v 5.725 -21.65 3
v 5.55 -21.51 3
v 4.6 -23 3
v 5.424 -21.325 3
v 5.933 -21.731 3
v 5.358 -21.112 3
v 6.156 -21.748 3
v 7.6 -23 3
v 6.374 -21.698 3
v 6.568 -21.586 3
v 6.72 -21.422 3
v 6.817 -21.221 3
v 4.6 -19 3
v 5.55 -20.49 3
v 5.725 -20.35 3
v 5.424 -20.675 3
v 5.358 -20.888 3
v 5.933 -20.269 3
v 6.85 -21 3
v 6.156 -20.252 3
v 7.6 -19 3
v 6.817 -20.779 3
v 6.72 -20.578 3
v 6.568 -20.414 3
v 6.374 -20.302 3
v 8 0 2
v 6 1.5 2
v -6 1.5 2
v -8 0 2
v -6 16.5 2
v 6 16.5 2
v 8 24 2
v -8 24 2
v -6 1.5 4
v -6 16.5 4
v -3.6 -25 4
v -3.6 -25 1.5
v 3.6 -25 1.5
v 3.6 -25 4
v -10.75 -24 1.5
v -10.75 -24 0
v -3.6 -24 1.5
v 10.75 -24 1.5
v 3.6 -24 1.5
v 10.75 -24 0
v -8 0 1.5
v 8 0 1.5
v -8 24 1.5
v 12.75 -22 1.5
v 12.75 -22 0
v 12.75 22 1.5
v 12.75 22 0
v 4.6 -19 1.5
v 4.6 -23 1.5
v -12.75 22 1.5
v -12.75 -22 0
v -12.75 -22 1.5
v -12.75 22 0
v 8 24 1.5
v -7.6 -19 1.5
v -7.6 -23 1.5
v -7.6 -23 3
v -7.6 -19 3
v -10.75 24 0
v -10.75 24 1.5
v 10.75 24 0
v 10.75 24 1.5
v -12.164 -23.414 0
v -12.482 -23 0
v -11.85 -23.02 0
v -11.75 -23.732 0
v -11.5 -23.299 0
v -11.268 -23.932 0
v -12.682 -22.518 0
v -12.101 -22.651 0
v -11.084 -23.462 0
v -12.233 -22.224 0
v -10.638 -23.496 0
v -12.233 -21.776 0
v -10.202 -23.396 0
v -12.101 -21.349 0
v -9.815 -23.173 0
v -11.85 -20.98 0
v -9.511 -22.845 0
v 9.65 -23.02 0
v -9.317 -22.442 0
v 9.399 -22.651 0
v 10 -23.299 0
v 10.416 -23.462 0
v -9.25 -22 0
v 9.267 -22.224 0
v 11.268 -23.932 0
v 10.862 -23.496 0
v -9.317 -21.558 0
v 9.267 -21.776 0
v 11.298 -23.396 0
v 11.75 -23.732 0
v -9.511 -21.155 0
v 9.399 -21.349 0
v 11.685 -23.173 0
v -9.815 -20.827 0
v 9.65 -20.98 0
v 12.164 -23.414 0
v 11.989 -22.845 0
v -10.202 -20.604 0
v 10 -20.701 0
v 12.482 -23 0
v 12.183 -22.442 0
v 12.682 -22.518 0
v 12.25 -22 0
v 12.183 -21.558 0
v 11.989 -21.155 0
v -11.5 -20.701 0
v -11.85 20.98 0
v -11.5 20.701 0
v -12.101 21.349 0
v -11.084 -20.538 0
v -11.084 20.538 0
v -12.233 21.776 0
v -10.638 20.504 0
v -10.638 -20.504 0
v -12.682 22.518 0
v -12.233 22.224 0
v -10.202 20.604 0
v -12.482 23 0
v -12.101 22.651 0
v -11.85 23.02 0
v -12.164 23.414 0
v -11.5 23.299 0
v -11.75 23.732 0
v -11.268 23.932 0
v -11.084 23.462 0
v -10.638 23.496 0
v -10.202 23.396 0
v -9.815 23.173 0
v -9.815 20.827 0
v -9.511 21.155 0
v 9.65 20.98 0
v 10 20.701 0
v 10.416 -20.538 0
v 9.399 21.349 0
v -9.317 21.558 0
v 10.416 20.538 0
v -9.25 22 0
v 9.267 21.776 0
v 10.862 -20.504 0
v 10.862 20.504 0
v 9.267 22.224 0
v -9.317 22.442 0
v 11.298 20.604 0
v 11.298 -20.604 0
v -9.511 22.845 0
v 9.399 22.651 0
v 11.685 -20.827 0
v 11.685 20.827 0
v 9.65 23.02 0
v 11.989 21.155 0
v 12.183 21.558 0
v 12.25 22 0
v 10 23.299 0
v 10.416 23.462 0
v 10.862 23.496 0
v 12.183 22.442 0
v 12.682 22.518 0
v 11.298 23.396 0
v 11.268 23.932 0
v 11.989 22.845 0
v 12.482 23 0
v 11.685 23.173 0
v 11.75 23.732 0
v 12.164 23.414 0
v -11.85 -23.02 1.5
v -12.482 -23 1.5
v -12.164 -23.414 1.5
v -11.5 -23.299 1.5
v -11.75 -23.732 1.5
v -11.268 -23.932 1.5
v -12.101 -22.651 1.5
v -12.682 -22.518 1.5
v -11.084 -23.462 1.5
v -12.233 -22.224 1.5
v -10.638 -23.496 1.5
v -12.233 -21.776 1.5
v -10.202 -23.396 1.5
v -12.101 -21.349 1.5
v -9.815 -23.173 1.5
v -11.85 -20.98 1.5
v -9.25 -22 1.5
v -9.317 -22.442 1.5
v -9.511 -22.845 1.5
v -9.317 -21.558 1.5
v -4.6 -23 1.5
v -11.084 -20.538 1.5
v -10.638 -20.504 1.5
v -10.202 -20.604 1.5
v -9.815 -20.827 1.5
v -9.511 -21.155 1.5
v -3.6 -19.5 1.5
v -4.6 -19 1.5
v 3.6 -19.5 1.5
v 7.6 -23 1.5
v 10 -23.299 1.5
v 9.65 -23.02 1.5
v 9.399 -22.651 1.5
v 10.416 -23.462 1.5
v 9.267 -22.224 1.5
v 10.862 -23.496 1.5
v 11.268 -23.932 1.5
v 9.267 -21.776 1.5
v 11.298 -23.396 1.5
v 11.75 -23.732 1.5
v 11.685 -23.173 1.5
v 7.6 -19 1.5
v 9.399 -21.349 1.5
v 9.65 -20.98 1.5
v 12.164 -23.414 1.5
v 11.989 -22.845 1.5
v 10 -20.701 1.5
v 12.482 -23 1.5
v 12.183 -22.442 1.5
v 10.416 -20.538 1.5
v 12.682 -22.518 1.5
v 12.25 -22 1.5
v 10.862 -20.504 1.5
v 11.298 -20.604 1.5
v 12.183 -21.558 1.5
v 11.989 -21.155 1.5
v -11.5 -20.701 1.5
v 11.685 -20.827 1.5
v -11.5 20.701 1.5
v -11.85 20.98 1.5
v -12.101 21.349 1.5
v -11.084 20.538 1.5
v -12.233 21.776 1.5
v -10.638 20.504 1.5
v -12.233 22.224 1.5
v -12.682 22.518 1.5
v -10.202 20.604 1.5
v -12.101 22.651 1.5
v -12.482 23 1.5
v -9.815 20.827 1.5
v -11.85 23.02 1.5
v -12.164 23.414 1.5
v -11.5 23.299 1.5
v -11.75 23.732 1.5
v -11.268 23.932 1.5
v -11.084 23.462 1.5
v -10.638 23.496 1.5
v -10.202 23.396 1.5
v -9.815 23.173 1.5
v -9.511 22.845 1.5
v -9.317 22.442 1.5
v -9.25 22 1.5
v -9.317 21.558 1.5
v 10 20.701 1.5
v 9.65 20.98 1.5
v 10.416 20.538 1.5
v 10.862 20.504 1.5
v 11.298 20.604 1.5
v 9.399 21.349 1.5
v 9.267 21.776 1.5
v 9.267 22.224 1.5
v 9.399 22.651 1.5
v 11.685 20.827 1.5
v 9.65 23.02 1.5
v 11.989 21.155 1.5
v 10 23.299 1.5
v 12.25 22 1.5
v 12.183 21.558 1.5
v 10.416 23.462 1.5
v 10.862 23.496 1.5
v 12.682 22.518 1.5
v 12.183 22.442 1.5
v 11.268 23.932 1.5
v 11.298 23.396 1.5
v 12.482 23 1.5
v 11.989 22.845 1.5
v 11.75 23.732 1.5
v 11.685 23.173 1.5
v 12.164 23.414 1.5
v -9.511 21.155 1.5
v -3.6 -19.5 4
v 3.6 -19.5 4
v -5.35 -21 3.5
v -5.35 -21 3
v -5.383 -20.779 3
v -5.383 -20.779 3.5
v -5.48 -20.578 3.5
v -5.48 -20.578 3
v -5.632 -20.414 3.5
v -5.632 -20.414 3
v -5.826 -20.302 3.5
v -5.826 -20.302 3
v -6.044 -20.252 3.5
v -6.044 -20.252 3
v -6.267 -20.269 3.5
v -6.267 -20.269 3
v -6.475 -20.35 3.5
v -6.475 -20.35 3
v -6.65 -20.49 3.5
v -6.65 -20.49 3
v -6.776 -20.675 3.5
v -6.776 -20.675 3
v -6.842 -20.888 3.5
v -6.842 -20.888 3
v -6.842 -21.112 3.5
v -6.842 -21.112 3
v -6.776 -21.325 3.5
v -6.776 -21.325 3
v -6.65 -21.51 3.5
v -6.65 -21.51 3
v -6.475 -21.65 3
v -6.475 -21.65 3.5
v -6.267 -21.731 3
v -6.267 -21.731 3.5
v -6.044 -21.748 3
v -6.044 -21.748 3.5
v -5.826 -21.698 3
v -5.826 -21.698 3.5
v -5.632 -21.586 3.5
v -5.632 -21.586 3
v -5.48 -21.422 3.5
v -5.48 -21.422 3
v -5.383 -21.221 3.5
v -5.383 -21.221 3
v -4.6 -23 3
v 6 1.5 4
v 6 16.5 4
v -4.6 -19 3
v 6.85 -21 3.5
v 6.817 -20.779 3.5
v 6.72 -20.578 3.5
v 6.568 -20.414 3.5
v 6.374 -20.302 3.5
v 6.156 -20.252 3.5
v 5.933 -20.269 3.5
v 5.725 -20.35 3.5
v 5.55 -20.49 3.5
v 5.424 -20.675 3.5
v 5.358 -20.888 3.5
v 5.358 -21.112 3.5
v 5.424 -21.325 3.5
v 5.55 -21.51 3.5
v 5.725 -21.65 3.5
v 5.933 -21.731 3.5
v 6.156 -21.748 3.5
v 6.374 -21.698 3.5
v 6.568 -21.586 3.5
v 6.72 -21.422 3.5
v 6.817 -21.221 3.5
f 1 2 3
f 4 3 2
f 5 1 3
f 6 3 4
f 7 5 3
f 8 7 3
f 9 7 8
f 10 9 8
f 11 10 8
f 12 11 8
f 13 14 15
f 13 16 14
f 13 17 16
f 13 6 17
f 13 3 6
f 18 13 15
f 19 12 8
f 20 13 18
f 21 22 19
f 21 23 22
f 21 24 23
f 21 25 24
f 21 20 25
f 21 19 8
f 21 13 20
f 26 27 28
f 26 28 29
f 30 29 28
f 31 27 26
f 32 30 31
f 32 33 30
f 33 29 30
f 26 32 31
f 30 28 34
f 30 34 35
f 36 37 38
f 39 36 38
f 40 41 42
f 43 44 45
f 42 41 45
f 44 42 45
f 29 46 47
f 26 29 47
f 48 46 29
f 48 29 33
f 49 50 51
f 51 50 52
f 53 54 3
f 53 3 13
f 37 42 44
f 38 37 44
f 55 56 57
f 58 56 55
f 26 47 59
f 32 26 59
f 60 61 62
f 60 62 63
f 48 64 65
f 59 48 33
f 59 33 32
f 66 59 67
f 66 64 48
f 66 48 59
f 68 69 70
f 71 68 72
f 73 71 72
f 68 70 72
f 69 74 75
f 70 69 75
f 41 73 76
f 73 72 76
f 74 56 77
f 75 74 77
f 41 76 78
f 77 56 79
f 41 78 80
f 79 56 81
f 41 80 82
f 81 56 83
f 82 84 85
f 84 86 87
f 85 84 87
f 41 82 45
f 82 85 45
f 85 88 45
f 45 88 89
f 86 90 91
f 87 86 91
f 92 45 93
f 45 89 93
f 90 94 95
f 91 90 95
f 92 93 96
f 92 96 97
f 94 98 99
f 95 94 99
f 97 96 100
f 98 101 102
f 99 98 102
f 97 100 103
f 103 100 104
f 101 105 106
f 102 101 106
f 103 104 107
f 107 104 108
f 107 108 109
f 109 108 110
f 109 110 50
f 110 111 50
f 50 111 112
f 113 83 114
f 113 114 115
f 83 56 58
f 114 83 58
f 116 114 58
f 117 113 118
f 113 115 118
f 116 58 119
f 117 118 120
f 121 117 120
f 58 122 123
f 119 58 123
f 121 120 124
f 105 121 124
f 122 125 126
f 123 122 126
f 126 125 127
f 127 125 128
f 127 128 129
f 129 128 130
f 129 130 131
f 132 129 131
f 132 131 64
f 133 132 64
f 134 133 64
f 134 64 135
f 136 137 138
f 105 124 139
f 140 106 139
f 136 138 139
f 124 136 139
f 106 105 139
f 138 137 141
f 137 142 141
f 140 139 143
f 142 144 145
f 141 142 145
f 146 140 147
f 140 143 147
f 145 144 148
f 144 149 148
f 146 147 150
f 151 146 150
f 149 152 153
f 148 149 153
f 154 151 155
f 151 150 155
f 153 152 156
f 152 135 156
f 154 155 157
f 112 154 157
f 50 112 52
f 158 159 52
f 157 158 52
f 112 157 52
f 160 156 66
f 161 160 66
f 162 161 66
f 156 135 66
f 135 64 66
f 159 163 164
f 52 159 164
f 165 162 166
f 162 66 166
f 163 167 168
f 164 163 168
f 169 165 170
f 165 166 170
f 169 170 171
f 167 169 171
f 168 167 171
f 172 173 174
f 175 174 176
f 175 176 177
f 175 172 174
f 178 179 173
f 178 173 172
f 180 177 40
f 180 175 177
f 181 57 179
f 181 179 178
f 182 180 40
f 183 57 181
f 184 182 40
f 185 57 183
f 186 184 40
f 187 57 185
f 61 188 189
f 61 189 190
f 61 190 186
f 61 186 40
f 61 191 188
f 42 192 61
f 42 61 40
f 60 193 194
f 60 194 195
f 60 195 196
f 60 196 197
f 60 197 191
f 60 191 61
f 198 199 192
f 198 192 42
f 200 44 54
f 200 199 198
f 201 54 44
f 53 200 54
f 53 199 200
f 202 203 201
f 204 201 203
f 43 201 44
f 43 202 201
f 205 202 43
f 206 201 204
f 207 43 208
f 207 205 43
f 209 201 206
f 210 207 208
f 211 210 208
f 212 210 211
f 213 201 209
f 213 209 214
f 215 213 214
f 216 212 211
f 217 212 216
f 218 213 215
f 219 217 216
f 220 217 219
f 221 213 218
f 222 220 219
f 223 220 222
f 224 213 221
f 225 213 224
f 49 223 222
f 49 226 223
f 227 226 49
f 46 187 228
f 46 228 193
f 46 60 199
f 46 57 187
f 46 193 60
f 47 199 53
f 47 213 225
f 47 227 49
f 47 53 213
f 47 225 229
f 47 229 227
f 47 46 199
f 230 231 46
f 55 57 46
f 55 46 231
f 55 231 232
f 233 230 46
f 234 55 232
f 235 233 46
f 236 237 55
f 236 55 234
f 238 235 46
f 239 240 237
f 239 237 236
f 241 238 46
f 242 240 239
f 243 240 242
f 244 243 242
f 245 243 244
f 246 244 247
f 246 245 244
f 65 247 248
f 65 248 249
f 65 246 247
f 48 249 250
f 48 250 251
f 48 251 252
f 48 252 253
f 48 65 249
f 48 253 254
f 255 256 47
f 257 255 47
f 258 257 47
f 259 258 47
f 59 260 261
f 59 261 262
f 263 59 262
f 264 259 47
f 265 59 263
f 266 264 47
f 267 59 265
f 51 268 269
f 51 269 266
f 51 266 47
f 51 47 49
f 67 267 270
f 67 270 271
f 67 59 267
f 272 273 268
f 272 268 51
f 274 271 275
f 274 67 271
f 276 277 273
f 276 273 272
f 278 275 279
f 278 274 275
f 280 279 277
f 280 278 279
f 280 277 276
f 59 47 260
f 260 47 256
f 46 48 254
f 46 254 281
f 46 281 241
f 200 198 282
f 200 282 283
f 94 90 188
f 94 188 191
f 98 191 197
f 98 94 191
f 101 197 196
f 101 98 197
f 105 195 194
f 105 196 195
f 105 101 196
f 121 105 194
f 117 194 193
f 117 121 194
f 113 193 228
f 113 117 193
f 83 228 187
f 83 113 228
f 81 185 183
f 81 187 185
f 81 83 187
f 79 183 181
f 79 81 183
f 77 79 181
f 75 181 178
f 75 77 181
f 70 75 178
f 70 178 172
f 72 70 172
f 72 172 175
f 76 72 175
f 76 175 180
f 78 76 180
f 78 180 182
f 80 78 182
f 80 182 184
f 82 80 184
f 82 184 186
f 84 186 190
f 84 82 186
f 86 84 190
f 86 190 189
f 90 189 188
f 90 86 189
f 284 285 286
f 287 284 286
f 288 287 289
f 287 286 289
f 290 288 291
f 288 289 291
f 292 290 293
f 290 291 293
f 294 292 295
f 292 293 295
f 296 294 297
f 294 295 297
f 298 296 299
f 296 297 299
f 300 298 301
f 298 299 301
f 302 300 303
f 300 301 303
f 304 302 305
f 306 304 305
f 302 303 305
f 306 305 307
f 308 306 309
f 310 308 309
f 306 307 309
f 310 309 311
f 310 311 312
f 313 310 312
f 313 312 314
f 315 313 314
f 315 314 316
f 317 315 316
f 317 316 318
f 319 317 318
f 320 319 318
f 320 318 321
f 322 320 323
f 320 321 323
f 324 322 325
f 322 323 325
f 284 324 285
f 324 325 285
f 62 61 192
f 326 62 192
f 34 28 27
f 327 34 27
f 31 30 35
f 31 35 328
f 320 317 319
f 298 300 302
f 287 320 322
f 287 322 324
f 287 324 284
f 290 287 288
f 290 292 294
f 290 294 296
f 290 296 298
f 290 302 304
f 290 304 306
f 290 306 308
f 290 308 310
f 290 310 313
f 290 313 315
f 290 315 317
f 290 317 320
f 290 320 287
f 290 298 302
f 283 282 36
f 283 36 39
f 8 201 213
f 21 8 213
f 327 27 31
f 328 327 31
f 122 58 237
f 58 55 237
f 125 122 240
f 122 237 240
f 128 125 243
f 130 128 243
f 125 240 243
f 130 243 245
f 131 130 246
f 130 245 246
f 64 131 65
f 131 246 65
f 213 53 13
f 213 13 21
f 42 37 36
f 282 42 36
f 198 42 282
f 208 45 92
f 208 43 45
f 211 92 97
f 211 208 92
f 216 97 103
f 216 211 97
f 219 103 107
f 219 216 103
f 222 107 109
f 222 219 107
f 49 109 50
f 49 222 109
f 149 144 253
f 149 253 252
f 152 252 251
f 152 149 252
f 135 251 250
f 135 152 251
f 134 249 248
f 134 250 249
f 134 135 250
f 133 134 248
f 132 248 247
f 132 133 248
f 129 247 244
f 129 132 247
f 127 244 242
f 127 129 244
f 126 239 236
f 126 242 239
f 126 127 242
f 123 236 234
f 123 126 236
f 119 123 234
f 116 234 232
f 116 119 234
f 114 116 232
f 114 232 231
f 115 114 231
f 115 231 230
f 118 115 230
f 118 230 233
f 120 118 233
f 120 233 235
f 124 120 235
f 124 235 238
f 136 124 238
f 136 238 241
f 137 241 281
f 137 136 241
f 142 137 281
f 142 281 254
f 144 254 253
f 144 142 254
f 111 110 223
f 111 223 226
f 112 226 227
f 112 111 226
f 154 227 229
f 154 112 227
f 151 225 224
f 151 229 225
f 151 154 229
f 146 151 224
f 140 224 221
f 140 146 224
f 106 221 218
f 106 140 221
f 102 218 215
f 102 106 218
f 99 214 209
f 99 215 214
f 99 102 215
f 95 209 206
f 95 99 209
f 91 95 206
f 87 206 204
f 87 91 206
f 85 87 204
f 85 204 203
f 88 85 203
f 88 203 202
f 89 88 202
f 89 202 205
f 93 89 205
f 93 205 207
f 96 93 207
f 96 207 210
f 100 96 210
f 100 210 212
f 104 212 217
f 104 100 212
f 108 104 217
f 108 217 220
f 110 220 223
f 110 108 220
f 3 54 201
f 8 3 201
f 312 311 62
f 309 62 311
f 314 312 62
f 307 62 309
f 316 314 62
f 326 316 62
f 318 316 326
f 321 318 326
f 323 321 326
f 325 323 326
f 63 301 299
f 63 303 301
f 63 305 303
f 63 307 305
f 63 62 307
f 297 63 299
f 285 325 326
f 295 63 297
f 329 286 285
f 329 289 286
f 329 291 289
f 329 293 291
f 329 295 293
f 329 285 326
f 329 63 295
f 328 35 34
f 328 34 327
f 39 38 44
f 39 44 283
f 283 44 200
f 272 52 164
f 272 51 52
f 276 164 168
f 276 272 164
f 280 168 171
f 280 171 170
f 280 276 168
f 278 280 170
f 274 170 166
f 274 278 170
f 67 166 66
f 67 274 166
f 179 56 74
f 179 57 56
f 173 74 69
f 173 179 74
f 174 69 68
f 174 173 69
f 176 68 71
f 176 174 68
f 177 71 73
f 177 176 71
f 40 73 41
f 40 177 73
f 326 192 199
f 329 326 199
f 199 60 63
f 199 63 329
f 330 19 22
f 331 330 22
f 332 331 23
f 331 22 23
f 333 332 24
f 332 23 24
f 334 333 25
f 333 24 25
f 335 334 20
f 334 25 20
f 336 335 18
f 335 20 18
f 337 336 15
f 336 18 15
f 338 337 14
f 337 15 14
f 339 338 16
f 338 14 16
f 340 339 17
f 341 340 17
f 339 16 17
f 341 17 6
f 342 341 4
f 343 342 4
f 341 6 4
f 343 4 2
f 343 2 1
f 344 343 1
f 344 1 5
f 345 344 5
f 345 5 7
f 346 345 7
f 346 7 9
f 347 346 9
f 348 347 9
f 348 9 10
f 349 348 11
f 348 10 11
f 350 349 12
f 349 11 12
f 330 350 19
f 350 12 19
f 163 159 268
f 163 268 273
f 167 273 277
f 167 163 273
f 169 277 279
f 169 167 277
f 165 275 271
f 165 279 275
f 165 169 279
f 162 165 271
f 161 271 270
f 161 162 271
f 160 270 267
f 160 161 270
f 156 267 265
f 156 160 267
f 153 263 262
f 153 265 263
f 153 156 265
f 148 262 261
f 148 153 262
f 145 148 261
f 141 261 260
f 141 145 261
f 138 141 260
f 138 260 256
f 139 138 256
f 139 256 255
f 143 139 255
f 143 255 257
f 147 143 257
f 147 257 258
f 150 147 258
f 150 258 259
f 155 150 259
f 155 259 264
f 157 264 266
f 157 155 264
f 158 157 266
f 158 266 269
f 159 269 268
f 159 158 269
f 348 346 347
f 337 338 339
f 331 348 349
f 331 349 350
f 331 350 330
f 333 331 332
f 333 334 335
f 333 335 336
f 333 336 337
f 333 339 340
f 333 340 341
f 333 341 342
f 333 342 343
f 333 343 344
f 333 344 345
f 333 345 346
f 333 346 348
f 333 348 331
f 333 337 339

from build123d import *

# Parameters (mm, degrees)
SKETCH1_W              = 25.5
SKETCH1_H              = 48
PCB_DEPTH              = 1.5
FILLET1_R              = 2
SCREW_HOLES_DEPTH      = 28.217870967
SCREW_HOLES_DEPTH_BACK = 28.217870967
SKETCH2_R              = 1.5
SKETCH3_W              = 16
SKETCH3_H              = 24
ESP_PCB_DEPTH          = 0.5
SKETCH4_W              = 12
SKETCH4_H              = 15
RF_CASING_DEPTH        = 2
SKETCH5_W              = 7.2
SKETCH5_H              = 5.5
USB_PORT_DEPTH         = 2.5
SKETCH6_W              = 3
SKETCH6_H              = 4
BUTTON_BOTTOM_DEPTH    = 1.5
SKETCH7_R              = 0.75
BUTTON_TOP_DEPTH       = 0.5


with BuildPart() as part:
    # Sketch1 → PCB (new body)
    with BuildSketch(Plane.XY):
        Rectangle(SKETCH1_W, SKETCH1_H)
    extrude(amount=PCB_DEPTH)

    # Fillet1
    fillet1_edges = [part.edges().sort_by_distance(p)[0] for p in [
        (12.75, -24, 0.75),
        (-12.75, -24, 0.75),
        (-12.75, 24, 0.75),
        (12.75, 24, 0.75),
    ]]
    fillet(fillet1_edges, radius=FILLET1_R)

    # Sketch2 → Screw holes (cut, two sides: drawn at the far end of the back side and taken through both)
    with BuildSketch(Plane.XY.offset(1.5).offset(-SCREW_HOLES_DEPTH_BACK)):
        with Locations((-10.75, 22)):
            Circle(SKETCH2_R)
        with Locations((10.75, 22)):
            Circle(SKETCH2_R)
        with Locations((10.75, -22)):
            Circle(SKETCH2_R)
        with Locations((-10.75, -22)):
            Circle(SKETCH2_R)
    extrude(amount=SCREW_HOLES_DEPTH + SCREW_HOLES_DEPTH_BACK, mode=Mode.SUBTRACT)

    # Sketch3 → ESP PCB (add)
    with BuildSketch(Plane.XY.offset(1.5)):
        with Locations((0, 12)):
            Rectangle(SKETCH3_W, SKETCH3_H)
    extrude(amount=ESP_PCB_DEPTH)

    # Sketch4 → RF Casing (add)
    with BuildSketch(Plane.XY.offset(2)):
        with Locations((0, 9)):
            Rectangle(SKETCH4_W, SKETCH4_H)
    extrude(amount=RF_CASING_DEPTH)

    # Sketch5 → USB Port (add)
    with BuildSketch(Plane.XY.offset(1.5)):
        with Locations((0, -22.25)):
            Rectangle(SKETCH5_W, SKETCH5_H)
    extrude(amount=USB_PORT_DEPTH)

    # Sketch6 → Button Bottom (add)
    with BuildSketch(Plane.XY.offset(1.5)):
        with Locations((-6.1, -21)):
            Rectangle(SKETCH6_W, SKETCH6_H)
        with Locations((6.1, -21)):
            Rectangle(SKETCH6_W, SKETCH6_H)
    extrude(amount=BUTTON_BOTTOM_DEPTH)

    # Sketch7 → Button Top (add)
    with BuildSketch(Plane.XY.offset(3)):
        with Locations((-6.1, -21)):
            Circle(SKETCH7_R)
        with Locations((6.1, -21)):
            Circle(SKETCH7_R)
    extrude(amount=BUTTON_TOP_DEPTH)


solid = part.part
